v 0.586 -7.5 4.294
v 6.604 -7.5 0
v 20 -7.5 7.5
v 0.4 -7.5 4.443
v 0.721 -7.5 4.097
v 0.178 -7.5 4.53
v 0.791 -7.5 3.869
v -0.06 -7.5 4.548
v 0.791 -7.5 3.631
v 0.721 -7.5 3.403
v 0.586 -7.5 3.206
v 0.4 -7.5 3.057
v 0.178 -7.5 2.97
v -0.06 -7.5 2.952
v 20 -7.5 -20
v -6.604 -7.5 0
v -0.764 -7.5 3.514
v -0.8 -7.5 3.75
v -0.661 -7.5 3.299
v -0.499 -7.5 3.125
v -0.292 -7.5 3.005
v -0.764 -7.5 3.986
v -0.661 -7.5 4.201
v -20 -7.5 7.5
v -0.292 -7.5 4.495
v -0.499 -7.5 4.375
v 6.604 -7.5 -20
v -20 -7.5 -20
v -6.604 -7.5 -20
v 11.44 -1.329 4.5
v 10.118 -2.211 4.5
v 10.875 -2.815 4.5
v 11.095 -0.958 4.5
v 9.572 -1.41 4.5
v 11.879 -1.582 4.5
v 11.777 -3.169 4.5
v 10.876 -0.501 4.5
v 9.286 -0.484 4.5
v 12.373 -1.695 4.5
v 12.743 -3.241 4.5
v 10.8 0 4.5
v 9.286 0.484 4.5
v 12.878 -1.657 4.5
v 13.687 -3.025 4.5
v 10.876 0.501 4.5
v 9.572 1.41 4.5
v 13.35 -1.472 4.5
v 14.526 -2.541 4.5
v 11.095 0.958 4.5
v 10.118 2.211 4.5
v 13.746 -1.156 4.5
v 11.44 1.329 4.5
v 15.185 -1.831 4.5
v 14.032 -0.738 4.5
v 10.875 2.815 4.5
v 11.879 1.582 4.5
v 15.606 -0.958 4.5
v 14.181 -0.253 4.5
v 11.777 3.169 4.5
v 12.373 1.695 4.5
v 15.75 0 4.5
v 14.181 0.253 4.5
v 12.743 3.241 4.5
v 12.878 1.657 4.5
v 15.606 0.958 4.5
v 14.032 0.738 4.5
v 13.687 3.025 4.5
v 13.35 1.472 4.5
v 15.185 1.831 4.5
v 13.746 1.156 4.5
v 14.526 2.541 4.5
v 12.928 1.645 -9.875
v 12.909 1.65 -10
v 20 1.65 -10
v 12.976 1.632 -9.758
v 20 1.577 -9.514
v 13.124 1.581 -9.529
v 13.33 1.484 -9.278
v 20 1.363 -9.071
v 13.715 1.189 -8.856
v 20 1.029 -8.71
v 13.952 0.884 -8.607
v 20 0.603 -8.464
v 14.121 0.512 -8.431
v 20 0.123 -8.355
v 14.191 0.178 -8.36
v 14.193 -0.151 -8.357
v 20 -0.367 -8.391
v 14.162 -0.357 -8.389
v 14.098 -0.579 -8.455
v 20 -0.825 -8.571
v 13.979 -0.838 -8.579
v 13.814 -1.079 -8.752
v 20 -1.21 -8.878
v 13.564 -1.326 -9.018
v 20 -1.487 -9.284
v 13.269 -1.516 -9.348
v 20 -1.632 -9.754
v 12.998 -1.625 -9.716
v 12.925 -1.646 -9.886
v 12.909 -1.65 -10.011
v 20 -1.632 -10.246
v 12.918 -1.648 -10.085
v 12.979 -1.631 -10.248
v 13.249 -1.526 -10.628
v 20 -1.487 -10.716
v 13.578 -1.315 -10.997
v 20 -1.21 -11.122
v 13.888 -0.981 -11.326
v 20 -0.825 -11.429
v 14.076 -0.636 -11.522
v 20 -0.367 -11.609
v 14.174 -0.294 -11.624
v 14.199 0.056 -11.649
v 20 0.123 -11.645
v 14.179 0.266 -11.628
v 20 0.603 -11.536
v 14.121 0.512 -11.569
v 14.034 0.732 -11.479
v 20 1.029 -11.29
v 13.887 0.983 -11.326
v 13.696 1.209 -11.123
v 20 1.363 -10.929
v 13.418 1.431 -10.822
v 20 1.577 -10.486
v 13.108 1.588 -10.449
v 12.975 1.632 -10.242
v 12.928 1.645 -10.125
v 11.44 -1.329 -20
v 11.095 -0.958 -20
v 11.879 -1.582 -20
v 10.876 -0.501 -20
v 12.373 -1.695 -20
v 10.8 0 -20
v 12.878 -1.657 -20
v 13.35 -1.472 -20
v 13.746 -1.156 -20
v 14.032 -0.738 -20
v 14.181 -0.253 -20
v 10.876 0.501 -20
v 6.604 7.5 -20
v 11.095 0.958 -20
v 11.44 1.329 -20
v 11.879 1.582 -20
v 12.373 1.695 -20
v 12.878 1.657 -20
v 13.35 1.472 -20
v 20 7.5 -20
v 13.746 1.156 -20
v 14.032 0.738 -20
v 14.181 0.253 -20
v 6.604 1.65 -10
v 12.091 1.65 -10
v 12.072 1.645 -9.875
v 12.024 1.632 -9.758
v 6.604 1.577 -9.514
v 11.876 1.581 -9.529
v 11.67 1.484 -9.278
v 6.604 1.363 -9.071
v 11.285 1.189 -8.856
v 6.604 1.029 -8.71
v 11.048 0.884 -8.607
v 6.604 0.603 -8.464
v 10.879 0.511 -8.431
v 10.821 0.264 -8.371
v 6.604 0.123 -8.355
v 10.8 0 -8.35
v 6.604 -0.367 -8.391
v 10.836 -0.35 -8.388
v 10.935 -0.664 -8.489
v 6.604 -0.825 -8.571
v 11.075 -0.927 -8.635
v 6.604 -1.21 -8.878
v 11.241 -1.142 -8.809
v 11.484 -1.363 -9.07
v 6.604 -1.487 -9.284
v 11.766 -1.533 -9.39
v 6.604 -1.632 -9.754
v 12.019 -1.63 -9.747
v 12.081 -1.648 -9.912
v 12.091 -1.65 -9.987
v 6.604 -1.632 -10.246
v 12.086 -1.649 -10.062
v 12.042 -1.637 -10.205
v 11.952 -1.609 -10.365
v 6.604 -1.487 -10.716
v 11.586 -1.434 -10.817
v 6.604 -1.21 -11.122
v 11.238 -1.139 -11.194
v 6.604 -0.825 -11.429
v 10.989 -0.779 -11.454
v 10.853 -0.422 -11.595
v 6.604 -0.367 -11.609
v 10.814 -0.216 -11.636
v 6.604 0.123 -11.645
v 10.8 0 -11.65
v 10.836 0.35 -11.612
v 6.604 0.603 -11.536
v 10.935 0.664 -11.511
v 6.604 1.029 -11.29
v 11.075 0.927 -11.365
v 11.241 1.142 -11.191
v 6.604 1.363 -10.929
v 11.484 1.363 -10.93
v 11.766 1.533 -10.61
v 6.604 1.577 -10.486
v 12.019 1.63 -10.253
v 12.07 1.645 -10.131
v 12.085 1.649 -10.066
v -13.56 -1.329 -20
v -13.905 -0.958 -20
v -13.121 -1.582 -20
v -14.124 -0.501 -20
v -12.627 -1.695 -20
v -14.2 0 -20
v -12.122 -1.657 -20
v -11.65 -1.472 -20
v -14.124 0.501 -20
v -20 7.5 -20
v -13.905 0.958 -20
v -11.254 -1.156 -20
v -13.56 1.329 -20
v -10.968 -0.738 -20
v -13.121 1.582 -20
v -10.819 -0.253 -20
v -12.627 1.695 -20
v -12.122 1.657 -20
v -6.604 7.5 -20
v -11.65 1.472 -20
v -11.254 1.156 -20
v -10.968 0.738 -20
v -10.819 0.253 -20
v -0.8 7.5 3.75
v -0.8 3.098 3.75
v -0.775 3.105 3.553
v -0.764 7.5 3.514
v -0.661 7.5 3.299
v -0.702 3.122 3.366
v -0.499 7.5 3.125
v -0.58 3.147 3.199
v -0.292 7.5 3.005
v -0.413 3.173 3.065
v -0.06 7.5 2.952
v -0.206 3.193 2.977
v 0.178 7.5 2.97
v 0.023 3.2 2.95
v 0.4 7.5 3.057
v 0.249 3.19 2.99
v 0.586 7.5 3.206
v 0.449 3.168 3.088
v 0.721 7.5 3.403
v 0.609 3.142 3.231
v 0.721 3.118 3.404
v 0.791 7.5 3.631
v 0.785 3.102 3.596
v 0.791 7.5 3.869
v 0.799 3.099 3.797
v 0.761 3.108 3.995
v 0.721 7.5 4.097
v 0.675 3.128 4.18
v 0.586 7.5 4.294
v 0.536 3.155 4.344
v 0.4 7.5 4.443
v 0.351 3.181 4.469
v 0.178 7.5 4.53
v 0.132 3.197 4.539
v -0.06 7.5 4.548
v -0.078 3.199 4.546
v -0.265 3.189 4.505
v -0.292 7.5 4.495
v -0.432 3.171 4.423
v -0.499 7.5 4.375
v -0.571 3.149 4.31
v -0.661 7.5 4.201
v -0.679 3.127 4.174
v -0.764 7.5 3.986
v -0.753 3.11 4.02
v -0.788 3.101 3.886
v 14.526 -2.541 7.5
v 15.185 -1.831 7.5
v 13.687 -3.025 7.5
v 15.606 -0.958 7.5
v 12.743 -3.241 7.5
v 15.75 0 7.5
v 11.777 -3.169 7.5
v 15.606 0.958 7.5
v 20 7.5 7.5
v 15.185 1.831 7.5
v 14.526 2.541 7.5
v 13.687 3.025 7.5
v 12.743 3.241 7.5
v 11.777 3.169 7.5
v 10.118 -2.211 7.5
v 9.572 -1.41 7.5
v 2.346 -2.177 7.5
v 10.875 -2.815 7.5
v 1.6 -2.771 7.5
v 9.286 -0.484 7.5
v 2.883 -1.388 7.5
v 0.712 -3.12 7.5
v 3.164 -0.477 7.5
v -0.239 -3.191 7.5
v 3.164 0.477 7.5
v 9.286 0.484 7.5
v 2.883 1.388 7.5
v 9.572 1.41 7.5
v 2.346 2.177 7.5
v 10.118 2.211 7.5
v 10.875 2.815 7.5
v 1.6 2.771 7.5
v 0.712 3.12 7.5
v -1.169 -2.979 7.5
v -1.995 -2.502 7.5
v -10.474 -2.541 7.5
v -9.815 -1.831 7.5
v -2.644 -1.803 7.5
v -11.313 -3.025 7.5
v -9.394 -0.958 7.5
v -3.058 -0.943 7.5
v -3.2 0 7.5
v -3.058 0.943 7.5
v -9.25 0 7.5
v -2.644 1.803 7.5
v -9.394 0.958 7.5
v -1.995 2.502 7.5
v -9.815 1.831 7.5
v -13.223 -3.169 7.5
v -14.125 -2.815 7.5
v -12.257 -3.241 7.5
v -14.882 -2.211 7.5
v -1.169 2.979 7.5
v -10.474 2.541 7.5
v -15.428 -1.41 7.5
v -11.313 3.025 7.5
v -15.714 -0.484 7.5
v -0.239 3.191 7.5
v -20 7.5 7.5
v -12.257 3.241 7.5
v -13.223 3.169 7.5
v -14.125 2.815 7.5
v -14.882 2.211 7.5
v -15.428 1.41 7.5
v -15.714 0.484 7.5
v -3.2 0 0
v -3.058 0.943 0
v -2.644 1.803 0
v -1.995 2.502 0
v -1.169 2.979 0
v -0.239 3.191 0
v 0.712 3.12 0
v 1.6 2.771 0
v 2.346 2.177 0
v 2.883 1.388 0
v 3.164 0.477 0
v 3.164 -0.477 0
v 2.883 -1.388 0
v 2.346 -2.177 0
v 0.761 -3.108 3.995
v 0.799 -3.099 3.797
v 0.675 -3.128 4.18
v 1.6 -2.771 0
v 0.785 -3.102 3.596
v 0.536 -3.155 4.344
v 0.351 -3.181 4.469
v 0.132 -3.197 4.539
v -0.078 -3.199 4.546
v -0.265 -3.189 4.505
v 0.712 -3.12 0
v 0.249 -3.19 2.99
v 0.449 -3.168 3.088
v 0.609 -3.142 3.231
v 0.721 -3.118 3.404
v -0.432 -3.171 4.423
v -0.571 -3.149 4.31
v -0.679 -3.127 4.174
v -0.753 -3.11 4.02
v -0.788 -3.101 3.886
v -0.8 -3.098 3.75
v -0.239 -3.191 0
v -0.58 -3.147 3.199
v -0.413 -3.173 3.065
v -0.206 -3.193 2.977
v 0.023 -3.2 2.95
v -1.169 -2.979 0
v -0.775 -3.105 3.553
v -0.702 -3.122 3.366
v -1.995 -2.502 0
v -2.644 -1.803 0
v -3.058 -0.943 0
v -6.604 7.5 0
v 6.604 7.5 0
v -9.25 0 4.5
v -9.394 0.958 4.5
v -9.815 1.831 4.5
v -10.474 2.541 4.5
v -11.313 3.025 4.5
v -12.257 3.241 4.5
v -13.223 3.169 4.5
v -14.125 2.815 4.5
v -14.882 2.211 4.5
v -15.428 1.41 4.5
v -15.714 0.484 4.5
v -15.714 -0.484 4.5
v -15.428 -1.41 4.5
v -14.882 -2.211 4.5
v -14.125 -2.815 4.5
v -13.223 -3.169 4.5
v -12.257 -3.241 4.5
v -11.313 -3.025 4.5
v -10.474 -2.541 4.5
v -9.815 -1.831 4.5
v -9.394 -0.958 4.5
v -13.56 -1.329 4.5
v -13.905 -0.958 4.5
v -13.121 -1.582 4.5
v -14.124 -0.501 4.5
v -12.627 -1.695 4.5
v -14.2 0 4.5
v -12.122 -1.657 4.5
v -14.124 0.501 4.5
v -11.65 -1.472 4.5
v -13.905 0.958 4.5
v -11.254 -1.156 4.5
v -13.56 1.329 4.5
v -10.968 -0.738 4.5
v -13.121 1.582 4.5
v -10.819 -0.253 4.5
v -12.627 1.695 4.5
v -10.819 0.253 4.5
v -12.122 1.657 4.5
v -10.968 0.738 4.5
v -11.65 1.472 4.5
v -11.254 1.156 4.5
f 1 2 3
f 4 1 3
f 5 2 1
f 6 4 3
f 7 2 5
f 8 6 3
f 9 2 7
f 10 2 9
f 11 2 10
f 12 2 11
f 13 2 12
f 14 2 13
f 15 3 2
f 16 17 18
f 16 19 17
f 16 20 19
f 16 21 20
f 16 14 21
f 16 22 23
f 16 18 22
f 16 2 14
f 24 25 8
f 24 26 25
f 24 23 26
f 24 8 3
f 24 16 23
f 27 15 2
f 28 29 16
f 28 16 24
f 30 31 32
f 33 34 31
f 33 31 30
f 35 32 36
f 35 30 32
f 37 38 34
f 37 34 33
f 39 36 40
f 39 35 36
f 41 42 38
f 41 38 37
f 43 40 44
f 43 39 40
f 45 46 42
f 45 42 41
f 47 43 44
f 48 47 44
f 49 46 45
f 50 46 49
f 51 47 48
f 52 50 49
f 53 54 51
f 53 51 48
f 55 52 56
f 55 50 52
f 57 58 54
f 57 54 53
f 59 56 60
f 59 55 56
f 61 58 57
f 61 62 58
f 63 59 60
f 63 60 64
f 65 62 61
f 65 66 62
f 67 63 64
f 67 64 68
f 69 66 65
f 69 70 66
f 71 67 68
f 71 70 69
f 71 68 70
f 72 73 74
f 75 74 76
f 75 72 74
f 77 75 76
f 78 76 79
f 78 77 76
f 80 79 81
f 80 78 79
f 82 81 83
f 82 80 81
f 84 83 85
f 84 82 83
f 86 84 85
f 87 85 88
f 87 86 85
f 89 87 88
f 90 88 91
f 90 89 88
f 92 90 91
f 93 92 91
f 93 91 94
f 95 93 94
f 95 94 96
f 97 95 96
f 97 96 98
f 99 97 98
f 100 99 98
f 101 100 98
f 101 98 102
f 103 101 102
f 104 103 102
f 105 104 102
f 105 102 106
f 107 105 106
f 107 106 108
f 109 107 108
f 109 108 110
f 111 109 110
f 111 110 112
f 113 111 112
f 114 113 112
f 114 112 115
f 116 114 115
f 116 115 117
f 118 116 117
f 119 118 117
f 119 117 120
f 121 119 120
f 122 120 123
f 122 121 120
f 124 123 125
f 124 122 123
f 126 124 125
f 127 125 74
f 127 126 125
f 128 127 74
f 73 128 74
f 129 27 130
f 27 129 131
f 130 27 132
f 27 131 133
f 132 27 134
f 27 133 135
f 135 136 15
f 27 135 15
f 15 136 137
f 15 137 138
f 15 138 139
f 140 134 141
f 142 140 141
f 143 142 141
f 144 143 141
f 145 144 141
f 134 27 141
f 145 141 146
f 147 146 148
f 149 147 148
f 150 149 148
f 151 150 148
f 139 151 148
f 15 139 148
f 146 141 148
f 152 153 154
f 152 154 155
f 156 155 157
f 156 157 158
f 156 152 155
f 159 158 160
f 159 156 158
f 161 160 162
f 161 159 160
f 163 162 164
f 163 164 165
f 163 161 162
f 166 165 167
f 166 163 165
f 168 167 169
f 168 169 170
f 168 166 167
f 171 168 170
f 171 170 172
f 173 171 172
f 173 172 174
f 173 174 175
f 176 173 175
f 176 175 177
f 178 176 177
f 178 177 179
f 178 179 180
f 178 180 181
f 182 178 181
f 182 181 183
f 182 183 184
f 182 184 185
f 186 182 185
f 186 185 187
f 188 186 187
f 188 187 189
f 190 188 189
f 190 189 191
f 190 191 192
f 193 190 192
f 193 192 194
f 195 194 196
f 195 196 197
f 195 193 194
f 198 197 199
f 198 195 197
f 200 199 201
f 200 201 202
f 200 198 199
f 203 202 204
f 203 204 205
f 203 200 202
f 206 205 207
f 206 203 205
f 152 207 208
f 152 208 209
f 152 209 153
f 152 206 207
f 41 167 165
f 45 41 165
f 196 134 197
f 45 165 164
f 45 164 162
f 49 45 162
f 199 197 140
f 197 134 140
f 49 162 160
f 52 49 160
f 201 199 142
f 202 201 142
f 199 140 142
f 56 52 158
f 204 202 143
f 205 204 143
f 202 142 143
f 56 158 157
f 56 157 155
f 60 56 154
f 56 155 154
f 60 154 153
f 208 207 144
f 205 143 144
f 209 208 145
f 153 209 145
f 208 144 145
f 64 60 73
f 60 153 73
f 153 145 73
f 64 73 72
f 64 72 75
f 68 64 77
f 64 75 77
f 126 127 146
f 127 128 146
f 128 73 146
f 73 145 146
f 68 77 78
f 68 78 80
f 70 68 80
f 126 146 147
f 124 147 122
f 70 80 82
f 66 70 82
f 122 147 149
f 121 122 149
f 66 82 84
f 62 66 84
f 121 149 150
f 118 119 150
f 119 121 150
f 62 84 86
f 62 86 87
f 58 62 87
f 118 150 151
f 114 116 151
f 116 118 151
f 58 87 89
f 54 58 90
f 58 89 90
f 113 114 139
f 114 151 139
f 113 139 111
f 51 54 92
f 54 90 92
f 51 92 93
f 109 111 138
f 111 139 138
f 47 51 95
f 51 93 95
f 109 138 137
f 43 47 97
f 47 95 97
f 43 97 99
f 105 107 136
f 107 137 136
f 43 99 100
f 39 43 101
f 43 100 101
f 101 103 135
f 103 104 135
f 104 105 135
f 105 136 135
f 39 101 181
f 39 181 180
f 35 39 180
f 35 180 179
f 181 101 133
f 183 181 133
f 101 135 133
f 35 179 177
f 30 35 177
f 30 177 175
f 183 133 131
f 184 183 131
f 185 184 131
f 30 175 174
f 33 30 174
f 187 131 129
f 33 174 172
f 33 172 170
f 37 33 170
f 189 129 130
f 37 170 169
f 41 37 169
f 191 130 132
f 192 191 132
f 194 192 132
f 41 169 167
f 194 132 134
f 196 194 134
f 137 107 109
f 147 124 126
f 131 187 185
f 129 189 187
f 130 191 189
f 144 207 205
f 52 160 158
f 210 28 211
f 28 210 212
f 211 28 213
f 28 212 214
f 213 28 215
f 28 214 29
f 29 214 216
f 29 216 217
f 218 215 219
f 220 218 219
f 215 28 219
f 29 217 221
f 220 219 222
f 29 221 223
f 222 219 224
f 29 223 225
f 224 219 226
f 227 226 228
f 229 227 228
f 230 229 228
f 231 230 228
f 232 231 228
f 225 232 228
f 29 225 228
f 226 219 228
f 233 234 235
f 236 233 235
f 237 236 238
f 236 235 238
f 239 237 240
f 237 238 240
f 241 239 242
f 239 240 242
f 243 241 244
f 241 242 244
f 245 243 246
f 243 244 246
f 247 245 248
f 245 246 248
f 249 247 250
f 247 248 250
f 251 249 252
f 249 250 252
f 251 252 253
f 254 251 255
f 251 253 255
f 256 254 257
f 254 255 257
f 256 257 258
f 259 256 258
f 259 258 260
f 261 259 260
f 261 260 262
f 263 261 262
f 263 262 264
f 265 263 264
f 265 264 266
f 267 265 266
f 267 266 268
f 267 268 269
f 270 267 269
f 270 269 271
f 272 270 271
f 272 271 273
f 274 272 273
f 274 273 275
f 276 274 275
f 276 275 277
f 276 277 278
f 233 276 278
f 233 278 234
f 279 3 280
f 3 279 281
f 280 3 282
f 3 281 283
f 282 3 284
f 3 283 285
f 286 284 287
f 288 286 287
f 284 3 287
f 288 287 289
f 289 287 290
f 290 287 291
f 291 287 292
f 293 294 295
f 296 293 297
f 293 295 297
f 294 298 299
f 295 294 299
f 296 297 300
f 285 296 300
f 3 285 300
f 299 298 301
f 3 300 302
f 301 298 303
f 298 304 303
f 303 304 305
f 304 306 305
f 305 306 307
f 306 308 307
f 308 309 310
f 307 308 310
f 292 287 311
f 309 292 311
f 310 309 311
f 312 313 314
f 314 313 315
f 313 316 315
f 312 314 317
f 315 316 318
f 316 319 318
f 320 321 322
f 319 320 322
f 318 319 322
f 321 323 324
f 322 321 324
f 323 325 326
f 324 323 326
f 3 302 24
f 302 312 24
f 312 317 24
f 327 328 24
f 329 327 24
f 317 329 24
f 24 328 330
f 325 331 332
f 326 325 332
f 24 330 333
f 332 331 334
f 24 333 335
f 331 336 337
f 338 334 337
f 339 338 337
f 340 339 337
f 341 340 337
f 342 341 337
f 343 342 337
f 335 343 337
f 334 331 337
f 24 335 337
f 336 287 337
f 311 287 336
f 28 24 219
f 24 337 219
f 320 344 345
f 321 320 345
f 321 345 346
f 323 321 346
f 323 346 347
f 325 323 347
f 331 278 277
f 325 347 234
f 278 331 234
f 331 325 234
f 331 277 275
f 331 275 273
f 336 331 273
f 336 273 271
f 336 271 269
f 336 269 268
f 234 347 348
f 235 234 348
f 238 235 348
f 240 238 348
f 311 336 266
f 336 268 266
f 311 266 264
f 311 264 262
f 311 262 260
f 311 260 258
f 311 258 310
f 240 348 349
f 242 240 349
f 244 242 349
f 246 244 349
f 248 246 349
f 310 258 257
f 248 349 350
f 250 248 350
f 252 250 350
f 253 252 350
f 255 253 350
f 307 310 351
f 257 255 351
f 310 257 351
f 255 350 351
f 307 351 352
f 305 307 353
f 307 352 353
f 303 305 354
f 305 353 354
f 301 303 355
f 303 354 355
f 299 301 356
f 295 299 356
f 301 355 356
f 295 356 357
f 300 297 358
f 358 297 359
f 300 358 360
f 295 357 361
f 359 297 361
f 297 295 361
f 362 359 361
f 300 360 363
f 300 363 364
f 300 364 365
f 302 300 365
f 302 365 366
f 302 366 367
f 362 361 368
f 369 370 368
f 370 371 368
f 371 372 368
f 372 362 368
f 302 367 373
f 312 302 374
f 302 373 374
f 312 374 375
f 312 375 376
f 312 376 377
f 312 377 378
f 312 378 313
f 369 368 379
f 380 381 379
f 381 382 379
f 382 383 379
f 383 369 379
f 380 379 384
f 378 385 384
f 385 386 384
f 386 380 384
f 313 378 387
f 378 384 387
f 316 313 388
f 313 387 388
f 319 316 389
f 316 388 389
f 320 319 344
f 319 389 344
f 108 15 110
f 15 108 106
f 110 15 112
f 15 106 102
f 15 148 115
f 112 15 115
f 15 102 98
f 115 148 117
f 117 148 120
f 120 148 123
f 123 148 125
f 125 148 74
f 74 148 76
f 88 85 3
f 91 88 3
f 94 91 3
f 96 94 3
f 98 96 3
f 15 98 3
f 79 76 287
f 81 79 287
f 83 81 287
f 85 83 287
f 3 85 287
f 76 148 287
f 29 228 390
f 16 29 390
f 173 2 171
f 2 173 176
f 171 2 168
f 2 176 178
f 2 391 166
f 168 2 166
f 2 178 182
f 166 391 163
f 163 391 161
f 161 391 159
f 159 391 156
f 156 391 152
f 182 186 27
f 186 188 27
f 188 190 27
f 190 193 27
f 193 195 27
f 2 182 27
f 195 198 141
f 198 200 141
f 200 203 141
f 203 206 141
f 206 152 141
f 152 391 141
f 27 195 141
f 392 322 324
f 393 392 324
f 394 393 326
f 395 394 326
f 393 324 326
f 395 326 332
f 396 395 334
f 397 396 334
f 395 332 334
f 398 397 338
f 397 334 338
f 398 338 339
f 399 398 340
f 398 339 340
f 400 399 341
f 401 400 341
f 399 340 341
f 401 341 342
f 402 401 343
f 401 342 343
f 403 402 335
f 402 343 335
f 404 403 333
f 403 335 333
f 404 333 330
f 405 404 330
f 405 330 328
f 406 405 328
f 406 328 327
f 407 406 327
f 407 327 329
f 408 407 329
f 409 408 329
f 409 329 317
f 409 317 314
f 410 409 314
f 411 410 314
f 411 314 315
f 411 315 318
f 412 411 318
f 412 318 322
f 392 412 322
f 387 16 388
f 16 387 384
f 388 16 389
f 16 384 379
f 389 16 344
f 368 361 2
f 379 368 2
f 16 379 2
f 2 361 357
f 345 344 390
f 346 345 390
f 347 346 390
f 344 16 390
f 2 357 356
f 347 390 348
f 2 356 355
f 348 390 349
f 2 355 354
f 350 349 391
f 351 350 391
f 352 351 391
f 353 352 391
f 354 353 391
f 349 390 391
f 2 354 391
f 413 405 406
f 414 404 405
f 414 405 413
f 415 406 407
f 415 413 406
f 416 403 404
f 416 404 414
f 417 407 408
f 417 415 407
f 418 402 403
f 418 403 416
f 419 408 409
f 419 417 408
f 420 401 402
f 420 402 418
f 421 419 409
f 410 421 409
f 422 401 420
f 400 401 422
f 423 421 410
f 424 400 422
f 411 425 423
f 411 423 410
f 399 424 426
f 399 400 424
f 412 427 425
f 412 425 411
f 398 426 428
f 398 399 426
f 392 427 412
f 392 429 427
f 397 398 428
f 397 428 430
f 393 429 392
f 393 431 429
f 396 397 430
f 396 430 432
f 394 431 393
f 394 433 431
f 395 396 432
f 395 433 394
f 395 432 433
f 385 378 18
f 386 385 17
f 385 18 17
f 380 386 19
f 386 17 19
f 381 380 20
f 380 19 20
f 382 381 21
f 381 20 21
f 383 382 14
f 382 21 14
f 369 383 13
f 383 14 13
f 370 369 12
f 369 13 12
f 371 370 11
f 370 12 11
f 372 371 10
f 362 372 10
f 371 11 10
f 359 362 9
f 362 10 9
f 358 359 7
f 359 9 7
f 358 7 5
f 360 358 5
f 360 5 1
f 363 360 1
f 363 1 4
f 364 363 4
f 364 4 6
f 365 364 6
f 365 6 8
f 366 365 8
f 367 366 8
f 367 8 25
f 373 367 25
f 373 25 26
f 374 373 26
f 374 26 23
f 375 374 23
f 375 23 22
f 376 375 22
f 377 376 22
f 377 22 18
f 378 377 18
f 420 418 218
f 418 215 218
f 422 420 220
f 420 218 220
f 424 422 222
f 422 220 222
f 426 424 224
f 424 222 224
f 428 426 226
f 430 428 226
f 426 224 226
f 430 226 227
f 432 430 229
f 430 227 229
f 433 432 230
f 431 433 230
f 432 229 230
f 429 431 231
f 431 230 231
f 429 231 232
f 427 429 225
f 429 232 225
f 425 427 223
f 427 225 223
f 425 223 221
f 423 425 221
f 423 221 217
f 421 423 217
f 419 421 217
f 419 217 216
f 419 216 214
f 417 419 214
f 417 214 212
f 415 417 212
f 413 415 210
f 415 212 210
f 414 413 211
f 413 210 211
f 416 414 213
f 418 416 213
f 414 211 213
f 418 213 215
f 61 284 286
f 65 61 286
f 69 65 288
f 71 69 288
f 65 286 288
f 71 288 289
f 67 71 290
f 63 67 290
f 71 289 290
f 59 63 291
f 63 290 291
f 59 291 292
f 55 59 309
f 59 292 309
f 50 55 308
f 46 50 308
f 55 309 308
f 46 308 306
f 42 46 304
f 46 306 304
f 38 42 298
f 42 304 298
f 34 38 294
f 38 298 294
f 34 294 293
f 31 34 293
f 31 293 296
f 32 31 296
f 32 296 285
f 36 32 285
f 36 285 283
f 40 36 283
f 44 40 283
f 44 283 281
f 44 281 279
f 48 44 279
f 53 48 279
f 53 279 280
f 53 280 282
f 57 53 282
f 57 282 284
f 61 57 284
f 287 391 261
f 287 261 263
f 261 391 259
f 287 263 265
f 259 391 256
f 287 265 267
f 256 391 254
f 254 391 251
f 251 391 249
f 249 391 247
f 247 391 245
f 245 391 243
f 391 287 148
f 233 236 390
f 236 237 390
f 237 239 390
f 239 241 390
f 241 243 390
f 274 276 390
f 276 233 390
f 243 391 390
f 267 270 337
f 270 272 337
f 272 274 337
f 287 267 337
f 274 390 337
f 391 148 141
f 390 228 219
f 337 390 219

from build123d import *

# Parameters (mm, degrees)
BOSS_EXTRUDE1_DEPTH                 = 7.5
CBORE_FOR_M3_SHCS1_D                = 3.4
CBORE_FOR_M3_SHCS1_CBORE_D          = 6.5
CBORE_FOR_M3_SHCS1_CBORE_DEPTH      = 3
M6_CLEARANCE_HOLE1_D                = 6.4
TAP_DRILL_FOR_M2X0_4_TAP1_D         = 1.6
TAP_START                           = 6.604
TAP_DRILL_FOR_M4X0_7_TAP1_OUTLINE_R = 1.65
TAP_DRILL_FOR_M4X0_7_TAP1_DEPTH     = 13.396


# Read off the part's stored shape, not the designer's step: Tap Drill for M4x0.7 Tap1
with BuildPart() as part:
    # Sketch1 → Boss-Extrude1 (new, symmetric)
    with BuildSketch(Plane(origin=(0, 0, 0), x_dir=(1, 0, 0), z_dir=(0, 1, 0))):
        Polygon((-6.604, 0), (6.604, 0), (6.604, 20), (20, 20), (20, -7.5), (-20, -7.5), (-20, 20), (-6.604, 20), align=None)
    extrude(amount=BOSS_EXTRUDE1_DEPTH, both=True)

    # CBORE for M3 SHCS1 (through all)
    with Locations(Plane.XY.offset(7.5)):
        with Locations((-12.5, 0), (12.5, 0)):
            CounterBoreHole(CBORE_FOR_M3_SHCS1_D / 2, CBORE_FOR_M3_SHCS1_CBORE_D / 2, CBORE_FOR_M3_SHCS1_CBORE_DEPTH)

    # M6 Clearance Hole1 (through all)
    with Locations(Plane.XY.offset(7.5)):
        with Locations((0, 0)):
            Hole(M6_CLEARANCE_HOLE1_D / 2)

    # Tap Drill for M2x0.4 Tap1 (through all)
    with Locations(Plane(origin=(0, 7.5, 0), x_dir=(1, 0, 0), z_dir=(0, 1, 0))):
        with Locations((0, -3.75)):
            Hole(TAP_DRILL_FOR_M2X0_4_TAP1_D / 2)

    # Tap Drill for M4x0.7 Tap1 outline → Tap Drill for M4x0.7 Tap1 (cut)
    with BuildSketch(Plane.YZ.offset(TAP_START)):
        with Locations((0, -10)):
            Circle(TAP_DRILL_FOR_M4X0_7_TAP1_OUTLINE_R)
    extrude(amount=TAP_DRILL_FOR_M4X0_7_TAP1_DEPTH, mode=Mode.SUBTRACT)


solid = part.part
